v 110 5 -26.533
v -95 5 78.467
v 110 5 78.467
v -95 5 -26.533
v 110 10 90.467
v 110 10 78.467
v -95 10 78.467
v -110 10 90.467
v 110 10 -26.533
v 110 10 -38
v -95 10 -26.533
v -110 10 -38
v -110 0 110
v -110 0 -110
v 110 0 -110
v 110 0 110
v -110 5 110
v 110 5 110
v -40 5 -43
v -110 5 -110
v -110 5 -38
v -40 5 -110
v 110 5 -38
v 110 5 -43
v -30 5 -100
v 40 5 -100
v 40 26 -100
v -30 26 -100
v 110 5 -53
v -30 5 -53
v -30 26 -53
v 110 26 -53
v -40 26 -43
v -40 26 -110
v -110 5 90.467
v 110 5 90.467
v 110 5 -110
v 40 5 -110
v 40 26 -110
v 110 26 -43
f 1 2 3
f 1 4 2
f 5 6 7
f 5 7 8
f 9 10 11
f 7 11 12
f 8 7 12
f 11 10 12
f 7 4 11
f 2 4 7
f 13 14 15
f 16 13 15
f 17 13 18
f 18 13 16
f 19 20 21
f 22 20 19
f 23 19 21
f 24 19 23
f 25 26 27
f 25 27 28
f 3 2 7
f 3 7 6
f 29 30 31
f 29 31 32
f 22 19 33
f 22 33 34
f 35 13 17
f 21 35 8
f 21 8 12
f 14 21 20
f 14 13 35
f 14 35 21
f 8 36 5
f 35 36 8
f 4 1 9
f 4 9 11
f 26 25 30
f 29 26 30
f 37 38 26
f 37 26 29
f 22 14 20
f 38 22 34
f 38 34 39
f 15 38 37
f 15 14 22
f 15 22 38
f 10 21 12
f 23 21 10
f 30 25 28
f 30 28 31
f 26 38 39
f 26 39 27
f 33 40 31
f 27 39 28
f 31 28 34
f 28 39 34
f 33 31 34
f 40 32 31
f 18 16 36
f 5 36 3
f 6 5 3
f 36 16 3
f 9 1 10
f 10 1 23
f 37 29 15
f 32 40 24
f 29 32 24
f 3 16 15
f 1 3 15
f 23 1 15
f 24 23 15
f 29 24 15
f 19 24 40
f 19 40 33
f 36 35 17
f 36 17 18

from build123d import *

# Parameters (mm, degrees)
SKETCH1_W           = 220
SKETCH1_H           = 220
BOSS_EXTRUDE1_DEPTH = 5
BOSS_EXTRUDE2_DEPTH = 21
BOSS_EXTRUDE3_DEPTH = 5


with BuildPart() as part:
    # Sketch1 → Boss-Extrude1 (new body)
    with BuildSketch(Plane(origin=(0, 0, 0), x_dir=(1, 0, 0), z_dir=(0, 1, 0))):
        Rectangle(SKETCH1_W, SKETCH1_H)
    extrude(amount=BOSS_EXTRUDE1_DEPTH)

    # Sketch2 → Boss-Extrude2 (add)
    with BuildSketch(Plane(origin=(0, 5, 0), x_dir=(1, 0, 0), z_dir=(0, 1, 0))):
        Polygon((-40, 110), (40, 110), (40, 100), (-30, 100), (-30, 53), (110, 53), (110, 43), (-40, 43), align=None)
    extrude(amount=BOSS_EXTRUDE2_DEPTH)

    # Sketch3 → Boss-Extrude3 (add)
    with BuildSketch(Plane(origin=(0, 5, 0), x_dir=(1, 0, 0), z_dir=(0, 1, 0))):
        Polygon((-110, 38), (110, 38), (110, 26.532503788), (-95, 26.532503788), (-95, -78.467496212), (110, -78.467496212), (110, -90.467496212), (-110, -90.467496212), align=None)
    extrude(amount=BOSS_EXTRUDE3_DEPTH)


solid = part.part
